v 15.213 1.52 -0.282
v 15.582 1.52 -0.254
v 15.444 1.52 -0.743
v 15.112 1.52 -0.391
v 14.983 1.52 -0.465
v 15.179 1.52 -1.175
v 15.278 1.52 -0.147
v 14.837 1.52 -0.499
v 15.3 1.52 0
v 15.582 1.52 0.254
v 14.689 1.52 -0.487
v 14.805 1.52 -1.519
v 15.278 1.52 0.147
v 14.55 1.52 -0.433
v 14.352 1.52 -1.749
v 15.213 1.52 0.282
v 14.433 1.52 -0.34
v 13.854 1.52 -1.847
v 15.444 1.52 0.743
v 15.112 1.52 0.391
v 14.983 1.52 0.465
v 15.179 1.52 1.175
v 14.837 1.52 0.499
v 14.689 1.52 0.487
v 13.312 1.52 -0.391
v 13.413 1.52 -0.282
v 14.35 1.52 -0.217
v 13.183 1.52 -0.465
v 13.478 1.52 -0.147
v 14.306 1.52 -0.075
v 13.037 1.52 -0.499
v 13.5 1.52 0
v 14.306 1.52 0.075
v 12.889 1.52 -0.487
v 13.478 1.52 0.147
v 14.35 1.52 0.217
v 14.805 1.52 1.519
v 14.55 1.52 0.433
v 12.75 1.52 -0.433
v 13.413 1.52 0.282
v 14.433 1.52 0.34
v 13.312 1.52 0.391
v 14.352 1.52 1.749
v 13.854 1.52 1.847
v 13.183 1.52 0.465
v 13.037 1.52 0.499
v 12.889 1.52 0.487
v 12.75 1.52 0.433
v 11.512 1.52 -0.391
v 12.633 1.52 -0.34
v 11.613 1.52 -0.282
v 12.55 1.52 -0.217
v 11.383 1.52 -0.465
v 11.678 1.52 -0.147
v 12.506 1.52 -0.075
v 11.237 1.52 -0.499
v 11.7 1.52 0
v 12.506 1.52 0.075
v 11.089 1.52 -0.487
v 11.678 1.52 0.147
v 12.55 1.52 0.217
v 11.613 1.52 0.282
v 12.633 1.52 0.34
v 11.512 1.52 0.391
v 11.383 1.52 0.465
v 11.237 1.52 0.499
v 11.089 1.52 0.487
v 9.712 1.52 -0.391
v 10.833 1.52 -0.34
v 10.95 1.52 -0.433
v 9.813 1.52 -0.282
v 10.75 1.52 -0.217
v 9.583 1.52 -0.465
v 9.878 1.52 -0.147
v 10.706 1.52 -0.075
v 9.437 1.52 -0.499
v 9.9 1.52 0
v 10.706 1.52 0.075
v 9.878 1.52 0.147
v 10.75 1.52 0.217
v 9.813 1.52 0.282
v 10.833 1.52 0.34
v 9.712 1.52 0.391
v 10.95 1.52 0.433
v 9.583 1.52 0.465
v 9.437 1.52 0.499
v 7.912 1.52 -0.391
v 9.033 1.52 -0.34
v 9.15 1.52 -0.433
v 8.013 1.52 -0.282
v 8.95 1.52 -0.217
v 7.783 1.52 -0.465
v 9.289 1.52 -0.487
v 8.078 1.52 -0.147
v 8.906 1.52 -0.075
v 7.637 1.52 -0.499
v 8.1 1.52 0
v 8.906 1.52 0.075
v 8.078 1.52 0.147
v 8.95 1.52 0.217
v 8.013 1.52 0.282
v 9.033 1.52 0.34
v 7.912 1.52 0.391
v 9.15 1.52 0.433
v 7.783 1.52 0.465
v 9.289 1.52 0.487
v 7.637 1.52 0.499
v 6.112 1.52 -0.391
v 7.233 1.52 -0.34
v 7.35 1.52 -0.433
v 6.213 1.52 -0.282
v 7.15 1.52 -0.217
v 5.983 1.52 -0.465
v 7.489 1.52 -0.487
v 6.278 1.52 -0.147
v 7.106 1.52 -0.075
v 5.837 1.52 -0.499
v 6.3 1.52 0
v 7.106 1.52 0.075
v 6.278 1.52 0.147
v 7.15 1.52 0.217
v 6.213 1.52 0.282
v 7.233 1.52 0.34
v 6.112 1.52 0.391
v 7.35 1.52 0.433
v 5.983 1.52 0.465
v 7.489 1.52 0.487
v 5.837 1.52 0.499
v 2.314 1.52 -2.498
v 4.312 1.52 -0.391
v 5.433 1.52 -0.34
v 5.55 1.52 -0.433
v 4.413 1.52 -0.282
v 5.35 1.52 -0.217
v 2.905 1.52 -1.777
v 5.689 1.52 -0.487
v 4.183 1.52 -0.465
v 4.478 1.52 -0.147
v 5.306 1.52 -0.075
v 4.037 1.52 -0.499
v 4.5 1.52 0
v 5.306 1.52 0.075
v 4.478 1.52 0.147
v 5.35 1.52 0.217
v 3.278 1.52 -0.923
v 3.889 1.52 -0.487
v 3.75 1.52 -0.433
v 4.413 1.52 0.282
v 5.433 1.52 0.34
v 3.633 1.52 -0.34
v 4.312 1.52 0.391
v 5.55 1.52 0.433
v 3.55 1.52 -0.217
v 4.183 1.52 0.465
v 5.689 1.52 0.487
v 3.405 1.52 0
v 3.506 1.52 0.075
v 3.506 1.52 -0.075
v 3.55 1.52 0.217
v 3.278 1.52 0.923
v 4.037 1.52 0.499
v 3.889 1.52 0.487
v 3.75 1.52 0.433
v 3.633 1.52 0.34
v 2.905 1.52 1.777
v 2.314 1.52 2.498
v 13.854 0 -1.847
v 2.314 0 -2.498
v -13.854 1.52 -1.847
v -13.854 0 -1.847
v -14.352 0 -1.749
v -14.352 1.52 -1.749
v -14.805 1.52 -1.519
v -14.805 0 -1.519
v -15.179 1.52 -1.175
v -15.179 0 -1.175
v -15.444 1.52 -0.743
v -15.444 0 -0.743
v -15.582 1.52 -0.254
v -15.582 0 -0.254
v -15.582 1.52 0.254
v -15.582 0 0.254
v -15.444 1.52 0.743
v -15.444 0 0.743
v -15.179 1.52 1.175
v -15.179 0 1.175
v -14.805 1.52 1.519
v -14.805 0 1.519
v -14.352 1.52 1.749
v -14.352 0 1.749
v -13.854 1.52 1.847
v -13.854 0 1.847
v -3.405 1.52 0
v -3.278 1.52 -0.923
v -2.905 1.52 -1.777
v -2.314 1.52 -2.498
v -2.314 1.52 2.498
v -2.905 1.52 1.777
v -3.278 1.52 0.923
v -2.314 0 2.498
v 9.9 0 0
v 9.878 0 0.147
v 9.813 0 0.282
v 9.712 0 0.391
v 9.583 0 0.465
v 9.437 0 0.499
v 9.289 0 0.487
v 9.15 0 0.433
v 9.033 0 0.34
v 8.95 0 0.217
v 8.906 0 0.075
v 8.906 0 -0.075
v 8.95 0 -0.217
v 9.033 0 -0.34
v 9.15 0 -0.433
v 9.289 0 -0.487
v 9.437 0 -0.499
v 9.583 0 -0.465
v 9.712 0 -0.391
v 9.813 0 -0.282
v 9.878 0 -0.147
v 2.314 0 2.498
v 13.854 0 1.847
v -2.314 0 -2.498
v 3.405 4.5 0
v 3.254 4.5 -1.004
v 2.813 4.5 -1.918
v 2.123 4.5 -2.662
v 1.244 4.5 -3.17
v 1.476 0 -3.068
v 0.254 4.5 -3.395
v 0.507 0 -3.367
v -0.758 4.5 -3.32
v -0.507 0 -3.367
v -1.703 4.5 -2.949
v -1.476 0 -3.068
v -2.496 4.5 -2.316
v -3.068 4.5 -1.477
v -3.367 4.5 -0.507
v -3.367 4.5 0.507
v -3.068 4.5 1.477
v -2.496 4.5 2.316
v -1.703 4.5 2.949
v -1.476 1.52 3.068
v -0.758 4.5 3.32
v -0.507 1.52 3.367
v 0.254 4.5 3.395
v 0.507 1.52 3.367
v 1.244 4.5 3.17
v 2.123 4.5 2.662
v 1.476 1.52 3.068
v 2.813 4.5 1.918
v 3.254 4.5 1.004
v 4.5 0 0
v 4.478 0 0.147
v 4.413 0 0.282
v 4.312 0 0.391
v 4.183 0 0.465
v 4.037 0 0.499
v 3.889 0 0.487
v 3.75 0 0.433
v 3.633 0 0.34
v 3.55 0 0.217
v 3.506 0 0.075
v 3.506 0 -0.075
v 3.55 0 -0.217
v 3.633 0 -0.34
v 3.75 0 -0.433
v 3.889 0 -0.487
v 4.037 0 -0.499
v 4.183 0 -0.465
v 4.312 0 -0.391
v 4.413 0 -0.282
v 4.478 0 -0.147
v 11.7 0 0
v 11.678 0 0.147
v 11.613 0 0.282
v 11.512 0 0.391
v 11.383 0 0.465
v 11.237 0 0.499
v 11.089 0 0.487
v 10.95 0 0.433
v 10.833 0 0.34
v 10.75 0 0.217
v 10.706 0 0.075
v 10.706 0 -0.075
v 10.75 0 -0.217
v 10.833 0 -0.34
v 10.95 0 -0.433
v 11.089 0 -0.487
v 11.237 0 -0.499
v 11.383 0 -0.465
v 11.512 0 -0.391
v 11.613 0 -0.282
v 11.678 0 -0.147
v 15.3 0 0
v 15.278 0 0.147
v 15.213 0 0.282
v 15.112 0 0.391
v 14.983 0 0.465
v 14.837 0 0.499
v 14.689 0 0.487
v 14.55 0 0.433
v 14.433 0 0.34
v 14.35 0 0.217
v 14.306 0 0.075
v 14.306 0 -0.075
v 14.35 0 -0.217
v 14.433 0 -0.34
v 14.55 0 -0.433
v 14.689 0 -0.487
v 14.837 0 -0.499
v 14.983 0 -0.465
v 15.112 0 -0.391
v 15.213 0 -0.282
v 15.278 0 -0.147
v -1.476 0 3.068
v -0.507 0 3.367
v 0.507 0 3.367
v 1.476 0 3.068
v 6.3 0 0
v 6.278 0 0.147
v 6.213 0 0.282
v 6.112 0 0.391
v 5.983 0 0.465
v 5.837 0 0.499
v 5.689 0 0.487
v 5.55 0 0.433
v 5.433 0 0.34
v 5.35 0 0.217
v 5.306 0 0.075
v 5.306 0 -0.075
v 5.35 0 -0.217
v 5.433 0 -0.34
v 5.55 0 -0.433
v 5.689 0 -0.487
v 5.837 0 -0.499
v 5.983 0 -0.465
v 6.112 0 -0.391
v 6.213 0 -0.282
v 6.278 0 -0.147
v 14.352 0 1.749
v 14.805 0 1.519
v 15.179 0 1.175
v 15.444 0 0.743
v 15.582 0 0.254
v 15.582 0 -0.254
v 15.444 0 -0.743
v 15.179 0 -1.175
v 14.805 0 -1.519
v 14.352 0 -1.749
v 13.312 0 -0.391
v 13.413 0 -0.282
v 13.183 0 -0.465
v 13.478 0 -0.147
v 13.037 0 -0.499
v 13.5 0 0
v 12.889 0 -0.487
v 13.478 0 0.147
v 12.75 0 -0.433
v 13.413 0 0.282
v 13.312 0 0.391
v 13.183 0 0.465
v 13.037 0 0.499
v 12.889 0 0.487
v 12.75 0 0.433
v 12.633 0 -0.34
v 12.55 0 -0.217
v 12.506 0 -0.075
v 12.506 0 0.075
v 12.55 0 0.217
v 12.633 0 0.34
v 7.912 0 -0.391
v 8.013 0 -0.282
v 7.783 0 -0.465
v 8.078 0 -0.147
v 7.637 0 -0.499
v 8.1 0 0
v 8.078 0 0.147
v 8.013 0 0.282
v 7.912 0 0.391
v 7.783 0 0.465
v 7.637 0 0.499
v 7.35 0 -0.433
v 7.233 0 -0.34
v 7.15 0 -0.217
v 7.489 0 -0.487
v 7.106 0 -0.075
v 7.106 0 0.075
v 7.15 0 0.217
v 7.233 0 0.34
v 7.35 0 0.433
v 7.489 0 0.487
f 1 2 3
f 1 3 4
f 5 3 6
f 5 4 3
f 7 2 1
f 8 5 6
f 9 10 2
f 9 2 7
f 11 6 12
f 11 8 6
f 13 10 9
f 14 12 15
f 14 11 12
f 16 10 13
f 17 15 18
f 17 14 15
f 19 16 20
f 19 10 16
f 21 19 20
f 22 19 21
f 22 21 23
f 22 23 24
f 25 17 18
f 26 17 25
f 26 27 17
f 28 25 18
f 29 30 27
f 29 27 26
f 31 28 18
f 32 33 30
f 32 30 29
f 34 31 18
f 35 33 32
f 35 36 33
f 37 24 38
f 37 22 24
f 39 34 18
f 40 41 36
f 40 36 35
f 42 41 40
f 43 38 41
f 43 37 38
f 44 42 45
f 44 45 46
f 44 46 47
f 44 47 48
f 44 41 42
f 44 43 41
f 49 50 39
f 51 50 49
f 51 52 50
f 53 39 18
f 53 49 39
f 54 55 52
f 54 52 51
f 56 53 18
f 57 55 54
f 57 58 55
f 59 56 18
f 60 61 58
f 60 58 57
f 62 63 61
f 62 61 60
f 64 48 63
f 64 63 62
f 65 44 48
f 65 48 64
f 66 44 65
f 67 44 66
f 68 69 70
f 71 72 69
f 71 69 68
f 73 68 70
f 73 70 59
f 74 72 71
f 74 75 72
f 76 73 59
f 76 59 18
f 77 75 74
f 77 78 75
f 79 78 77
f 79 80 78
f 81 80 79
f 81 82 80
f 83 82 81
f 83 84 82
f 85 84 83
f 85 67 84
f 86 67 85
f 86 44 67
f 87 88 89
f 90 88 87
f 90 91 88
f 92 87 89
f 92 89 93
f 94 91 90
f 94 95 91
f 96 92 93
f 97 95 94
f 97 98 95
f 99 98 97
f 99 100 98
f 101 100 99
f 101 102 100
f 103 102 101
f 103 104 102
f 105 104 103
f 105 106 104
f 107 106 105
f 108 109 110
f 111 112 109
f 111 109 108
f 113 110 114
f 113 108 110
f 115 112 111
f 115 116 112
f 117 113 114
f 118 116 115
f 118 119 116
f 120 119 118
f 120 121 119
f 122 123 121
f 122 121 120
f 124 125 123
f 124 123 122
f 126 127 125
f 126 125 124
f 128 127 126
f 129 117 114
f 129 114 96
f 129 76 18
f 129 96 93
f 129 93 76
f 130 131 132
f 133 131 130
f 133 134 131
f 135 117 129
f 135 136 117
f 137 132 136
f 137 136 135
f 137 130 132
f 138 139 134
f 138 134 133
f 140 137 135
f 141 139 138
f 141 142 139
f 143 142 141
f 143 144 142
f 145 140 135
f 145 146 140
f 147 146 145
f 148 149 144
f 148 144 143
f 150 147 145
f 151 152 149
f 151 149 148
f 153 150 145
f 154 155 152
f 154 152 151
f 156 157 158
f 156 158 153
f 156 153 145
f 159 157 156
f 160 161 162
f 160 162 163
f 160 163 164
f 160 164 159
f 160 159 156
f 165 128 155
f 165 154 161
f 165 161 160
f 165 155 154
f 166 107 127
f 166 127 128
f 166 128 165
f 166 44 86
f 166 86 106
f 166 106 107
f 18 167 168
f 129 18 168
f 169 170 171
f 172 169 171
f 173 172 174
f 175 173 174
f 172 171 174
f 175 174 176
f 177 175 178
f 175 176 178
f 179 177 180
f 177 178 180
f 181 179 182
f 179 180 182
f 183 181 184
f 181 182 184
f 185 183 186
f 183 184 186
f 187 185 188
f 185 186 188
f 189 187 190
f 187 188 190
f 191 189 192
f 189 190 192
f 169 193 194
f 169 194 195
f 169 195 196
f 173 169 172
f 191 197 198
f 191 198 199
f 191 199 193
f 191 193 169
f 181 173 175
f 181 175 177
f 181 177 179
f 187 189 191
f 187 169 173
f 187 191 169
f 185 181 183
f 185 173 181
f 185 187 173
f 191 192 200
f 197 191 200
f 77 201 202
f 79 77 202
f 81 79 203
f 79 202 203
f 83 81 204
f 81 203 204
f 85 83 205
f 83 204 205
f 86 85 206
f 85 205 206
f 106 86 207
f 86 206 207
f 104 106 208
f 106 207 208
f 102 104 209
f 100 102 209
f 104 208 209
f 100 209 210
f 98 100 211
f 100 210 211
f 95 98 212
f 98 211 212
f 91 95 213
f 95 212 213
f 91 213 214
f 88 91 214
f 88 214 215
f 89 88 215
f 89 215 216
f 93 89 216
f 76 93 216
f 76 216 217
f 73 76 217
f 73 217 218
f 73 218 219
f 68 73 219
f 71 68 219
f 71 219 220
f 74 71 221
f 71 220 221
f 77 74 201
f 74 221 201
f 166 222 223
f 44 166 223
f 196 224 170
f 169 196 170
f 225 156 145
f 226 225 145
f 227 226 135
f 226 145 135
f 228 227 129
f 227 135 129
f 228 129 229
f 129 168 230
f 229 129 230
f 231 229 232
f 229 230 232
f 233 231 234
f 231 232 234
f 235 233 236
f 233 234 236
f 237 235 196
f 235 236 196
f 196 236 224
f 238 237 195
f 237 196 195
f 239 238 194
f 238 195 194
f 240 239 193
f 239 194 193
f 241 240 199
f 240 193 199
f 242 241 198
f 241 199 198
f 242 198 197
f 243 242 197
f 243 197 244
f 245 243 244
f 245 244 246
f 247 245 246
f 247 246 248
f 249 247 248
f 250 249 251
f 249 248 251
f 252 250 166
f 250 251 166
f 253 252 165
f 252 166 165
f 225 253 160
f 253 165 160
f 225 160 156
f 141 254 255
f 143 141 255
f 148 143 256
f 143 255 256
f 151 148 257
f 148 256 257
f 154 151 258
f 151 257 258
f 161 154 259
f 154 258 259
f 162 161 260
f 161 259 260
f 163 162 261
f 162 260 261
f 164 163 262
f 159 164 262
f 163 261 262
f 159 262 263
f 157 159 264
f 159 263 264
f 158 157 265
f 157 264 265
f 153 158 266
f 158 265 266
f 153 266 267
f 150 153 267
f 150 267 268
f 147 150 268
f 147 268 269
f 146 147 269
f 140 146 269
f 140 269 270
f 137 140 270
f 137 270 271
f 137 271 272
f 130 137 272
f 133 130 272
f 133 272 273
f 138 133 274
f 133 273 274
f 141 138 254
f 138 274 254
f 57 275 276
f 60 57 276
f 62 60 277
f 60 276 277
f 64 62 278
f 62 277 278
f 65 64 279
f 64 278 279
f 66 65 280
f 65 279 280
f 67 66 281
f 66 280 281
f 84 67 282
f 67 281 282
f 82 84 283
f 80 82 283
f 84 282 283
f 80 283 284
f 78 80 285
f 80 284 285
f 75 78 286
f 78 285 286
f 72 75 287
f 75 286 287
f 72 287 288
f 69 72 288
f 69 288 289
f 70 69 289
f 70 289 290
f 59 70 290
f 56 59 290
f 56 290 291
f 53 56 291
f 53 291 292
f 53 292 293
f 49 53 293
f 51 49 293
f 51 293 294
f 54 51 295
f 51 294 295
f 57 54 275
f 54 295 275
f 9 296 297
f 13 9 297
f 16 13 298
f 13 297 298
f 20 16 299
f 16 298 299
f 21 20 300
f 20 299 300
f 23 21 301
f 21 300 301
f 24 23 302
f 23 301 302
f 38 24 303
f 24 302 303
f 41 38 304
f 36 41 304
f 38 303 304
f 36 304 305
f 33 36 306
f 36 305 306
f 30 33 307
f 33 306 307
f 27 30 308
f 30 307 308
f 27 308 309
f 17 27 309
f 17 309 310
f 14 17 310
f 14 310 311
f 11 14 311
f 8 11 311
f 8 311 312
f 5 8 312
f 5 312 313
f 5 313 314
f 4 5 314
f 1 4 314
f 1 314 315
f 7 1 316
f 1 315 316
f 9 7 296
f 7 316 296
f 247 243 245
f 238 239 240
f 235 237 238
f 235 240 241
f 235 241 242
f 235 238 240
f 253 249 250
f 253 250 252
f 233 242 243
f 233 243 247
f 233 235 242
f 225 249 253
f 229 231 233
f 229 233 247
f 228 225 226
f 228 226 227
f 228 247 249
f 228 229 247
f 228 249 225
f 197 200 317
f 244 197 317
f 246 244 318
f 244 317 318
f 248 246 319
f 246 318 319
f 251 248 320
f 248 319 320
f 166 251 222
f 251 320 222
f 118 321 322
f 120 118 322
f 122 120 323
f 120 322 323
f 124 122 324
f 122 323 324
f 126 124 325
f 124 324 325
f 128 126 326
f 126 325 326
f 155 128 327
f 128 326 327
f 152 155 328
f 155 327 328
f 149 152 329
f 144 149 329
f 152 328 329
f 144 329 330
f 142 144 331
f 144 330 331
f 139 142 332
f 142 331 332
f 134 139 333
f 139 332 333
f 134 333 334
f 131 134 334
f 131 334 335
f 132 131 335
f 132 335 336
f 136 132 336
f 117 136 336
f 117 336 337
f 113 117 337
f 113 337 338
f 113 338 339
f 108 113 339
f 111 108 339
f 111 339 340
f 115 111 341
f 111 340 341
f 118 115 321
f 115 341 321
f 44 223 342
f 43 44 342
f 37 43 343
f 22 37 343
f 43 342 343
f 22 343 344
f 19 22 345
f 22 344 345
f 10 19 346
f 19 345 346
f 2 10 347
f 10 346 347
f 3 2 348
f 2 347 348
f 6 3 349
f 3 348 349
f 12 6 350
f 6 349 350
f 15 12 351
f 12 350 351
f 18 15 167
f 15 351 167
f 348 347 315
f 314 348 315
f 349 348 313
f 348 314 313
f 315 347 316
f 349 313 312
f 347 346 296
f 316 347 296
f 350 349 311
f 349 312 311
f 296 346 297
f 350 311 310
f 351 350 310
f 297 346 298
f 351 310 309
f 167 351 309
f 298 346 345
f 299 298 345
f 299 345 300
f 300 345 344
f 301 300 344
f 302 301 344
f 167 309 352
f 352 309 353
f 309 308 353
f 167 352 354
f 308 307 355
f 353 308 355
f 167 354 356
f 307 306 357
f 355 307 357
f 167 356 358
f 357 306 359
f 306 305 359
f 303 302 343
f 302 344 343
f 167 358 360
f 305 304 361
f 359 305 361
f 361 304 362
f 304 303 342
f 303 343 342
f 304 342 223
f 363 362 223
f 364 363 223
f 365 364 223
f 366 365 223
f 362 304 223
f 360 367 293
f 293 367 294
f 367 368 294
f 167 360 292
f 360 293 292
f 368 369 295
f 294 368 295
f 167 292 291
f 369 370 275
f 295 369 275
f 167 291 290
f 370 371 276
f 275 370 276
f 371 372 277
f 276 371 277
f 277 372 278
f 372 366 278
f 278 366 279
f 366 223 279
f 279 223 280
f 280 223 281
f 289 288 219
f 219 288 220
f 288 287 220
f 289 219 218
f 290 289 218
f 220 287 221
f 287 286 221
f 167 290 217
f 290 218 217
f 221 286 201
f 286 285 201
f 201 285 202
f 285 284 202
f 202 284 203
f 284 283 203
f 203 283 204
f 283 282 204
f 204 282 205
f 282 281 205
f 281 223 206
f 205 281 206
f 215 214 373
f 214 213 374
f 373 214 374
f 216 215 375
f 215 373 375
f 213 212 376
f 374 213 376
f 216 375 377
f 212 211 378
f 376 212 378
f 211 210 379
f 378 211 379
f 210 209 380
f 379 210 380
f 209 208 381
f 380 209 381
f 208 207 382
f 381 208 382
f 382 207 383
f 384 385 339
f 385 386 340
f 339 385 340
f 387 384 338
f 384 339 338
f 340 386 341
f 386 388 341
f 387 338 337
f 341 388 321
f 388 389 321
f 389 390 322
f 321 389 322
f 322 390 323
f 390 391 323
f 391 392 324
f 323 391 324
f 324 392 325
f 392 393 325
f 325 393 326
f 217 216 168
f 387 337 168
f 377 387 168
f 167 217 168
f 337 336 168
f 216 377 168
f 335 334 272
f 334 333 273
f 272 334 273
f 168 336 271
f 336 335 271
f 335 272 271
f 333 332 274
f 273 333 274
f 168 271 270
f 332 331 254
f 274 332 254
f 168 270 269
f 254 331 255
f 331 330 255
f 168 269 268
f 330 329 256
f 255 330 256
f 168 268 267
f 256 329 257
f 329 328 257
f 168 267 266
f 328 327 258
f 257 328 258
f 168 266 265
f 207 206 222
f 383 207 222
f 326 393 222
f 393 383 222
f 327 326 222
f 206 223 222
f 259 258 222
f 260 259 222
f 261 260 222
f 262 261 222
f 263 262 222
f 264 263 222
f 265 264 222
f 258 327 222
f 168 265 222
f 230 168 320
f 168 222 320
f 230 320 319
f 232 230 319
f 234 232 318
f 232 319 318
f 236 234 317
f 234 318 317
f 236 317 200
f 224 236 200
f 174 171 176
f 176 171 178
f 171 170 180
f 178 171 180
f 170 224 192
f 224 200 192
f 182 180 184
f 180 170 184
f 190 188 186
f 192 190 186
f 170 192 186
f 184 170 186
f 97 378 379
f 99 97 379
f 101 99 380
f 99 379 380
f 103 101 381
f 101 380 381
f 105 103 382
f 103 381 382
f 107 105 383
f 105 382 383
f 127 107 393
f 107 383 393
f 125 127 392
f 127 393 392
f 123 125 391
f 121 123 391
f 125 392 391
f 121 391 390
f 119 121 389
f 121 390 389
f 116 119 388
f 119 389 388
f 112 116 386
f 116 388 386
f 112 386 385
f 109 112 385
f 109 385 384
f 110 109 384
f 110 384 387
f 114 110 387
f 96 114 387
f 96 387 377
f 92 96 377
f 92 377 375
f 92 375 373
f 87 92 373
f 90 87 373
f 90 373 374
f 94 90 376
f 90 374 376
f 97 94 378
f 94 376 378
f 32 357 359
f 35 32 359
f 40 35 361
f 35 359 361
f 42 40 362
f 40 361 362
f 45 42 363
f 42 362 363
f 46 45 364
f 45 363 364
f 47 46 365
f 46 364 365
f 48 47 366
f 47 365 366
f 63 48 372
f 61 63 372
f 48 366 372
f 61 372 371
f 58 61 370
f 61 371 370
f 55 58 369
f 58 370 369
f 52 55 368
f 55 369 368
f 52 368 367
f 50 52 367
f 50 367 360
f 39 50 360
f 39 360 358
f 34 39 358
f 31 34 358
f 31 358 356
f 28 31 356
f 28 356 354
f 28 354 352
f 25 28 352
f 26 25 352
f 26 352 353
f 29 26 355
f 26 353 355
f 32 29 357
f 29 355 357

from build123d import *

# Parameters (mm, degrees)
SKETCH_1_R          = 3.405
EXTRUDE_1_DEPTH     = 4.5
EXTRUDE_2_DEPTH     = 1.52
SKETCH_3_R          = 0.5
CUT_EXTRUDE_1_DEPTH = 1.52


with BuildPart() as part:
    # 草图1 → 凸台-拉伸1 (new body)
    with BuildSketch(Plane(origin=(0, 0, 0), x_dir=(1, 0, 0), z_dir=(0, 1, 0))):
        Circle(SKETCH_1_R)
    extrude(amount=EXTRUDE_1_DEPTH)

    # 草图2 → 凸台-拉伸2 (add)
    with BuildSketch(Plane.XZ):
        with BuildLine():
            Line((2.314339904, 2.497569981), (13.854119989, 1.847067684))
            ThreePointArc((13.854119989, 1.847067684), (15.6, 0), (13.854119989, -1.847067684))
            Line((13.854119989, -1.847067684), (2.314339904, -2.497569981))
            ThreePointArc((2.314339904, -2.497569981), (0, -3.405), (-2.314339904, -2.497569981))
            Line((-2.314339904, -2.497569981), (-13.854119989, -1.847067684))
            ThreePointArc((-13.854119989, -1.847067684), (-15.6, 0), (-13.854119989, 1.847067684))
            Line((-13.854119989, 1.847067684), (-2.314339904, 2.497569981))
            ThreePointArc((-2.314339904, 2.497569981), (0, 3.405), (2.314339904, 2.497569981))
        make_face()
    extrude(amount=-EXTRUDE_2_DEPTH)

    # 草图3 → 切除-拉伸1 (cut)
    with BuildSketch(Plane.XZ):
        with Locations((4, 0)):
            Circle(SKETCH_3_R)
        with Locations((5.8, 0)):
            Circle(SKETCH_3_R)
        with Locations((7.6, 0)):
            Circle(SKETCH_3_R)
        with Locations((9.4, 0)):
            Circle(SKETCH_3_R)
        with Locations((11.2, 0)):
            Circle(SKETCH_3_R)
        with Locations((13, 0)):
            Circle(SKETCH_3_R)
        with Locations((14.8, 0)):
            Circle(SKETCH_3_R)
    extrude(amount=-CUT_EXTRUDE_1_DEPTH, mode=Mode.SUBTRACT)


solid = part.part
